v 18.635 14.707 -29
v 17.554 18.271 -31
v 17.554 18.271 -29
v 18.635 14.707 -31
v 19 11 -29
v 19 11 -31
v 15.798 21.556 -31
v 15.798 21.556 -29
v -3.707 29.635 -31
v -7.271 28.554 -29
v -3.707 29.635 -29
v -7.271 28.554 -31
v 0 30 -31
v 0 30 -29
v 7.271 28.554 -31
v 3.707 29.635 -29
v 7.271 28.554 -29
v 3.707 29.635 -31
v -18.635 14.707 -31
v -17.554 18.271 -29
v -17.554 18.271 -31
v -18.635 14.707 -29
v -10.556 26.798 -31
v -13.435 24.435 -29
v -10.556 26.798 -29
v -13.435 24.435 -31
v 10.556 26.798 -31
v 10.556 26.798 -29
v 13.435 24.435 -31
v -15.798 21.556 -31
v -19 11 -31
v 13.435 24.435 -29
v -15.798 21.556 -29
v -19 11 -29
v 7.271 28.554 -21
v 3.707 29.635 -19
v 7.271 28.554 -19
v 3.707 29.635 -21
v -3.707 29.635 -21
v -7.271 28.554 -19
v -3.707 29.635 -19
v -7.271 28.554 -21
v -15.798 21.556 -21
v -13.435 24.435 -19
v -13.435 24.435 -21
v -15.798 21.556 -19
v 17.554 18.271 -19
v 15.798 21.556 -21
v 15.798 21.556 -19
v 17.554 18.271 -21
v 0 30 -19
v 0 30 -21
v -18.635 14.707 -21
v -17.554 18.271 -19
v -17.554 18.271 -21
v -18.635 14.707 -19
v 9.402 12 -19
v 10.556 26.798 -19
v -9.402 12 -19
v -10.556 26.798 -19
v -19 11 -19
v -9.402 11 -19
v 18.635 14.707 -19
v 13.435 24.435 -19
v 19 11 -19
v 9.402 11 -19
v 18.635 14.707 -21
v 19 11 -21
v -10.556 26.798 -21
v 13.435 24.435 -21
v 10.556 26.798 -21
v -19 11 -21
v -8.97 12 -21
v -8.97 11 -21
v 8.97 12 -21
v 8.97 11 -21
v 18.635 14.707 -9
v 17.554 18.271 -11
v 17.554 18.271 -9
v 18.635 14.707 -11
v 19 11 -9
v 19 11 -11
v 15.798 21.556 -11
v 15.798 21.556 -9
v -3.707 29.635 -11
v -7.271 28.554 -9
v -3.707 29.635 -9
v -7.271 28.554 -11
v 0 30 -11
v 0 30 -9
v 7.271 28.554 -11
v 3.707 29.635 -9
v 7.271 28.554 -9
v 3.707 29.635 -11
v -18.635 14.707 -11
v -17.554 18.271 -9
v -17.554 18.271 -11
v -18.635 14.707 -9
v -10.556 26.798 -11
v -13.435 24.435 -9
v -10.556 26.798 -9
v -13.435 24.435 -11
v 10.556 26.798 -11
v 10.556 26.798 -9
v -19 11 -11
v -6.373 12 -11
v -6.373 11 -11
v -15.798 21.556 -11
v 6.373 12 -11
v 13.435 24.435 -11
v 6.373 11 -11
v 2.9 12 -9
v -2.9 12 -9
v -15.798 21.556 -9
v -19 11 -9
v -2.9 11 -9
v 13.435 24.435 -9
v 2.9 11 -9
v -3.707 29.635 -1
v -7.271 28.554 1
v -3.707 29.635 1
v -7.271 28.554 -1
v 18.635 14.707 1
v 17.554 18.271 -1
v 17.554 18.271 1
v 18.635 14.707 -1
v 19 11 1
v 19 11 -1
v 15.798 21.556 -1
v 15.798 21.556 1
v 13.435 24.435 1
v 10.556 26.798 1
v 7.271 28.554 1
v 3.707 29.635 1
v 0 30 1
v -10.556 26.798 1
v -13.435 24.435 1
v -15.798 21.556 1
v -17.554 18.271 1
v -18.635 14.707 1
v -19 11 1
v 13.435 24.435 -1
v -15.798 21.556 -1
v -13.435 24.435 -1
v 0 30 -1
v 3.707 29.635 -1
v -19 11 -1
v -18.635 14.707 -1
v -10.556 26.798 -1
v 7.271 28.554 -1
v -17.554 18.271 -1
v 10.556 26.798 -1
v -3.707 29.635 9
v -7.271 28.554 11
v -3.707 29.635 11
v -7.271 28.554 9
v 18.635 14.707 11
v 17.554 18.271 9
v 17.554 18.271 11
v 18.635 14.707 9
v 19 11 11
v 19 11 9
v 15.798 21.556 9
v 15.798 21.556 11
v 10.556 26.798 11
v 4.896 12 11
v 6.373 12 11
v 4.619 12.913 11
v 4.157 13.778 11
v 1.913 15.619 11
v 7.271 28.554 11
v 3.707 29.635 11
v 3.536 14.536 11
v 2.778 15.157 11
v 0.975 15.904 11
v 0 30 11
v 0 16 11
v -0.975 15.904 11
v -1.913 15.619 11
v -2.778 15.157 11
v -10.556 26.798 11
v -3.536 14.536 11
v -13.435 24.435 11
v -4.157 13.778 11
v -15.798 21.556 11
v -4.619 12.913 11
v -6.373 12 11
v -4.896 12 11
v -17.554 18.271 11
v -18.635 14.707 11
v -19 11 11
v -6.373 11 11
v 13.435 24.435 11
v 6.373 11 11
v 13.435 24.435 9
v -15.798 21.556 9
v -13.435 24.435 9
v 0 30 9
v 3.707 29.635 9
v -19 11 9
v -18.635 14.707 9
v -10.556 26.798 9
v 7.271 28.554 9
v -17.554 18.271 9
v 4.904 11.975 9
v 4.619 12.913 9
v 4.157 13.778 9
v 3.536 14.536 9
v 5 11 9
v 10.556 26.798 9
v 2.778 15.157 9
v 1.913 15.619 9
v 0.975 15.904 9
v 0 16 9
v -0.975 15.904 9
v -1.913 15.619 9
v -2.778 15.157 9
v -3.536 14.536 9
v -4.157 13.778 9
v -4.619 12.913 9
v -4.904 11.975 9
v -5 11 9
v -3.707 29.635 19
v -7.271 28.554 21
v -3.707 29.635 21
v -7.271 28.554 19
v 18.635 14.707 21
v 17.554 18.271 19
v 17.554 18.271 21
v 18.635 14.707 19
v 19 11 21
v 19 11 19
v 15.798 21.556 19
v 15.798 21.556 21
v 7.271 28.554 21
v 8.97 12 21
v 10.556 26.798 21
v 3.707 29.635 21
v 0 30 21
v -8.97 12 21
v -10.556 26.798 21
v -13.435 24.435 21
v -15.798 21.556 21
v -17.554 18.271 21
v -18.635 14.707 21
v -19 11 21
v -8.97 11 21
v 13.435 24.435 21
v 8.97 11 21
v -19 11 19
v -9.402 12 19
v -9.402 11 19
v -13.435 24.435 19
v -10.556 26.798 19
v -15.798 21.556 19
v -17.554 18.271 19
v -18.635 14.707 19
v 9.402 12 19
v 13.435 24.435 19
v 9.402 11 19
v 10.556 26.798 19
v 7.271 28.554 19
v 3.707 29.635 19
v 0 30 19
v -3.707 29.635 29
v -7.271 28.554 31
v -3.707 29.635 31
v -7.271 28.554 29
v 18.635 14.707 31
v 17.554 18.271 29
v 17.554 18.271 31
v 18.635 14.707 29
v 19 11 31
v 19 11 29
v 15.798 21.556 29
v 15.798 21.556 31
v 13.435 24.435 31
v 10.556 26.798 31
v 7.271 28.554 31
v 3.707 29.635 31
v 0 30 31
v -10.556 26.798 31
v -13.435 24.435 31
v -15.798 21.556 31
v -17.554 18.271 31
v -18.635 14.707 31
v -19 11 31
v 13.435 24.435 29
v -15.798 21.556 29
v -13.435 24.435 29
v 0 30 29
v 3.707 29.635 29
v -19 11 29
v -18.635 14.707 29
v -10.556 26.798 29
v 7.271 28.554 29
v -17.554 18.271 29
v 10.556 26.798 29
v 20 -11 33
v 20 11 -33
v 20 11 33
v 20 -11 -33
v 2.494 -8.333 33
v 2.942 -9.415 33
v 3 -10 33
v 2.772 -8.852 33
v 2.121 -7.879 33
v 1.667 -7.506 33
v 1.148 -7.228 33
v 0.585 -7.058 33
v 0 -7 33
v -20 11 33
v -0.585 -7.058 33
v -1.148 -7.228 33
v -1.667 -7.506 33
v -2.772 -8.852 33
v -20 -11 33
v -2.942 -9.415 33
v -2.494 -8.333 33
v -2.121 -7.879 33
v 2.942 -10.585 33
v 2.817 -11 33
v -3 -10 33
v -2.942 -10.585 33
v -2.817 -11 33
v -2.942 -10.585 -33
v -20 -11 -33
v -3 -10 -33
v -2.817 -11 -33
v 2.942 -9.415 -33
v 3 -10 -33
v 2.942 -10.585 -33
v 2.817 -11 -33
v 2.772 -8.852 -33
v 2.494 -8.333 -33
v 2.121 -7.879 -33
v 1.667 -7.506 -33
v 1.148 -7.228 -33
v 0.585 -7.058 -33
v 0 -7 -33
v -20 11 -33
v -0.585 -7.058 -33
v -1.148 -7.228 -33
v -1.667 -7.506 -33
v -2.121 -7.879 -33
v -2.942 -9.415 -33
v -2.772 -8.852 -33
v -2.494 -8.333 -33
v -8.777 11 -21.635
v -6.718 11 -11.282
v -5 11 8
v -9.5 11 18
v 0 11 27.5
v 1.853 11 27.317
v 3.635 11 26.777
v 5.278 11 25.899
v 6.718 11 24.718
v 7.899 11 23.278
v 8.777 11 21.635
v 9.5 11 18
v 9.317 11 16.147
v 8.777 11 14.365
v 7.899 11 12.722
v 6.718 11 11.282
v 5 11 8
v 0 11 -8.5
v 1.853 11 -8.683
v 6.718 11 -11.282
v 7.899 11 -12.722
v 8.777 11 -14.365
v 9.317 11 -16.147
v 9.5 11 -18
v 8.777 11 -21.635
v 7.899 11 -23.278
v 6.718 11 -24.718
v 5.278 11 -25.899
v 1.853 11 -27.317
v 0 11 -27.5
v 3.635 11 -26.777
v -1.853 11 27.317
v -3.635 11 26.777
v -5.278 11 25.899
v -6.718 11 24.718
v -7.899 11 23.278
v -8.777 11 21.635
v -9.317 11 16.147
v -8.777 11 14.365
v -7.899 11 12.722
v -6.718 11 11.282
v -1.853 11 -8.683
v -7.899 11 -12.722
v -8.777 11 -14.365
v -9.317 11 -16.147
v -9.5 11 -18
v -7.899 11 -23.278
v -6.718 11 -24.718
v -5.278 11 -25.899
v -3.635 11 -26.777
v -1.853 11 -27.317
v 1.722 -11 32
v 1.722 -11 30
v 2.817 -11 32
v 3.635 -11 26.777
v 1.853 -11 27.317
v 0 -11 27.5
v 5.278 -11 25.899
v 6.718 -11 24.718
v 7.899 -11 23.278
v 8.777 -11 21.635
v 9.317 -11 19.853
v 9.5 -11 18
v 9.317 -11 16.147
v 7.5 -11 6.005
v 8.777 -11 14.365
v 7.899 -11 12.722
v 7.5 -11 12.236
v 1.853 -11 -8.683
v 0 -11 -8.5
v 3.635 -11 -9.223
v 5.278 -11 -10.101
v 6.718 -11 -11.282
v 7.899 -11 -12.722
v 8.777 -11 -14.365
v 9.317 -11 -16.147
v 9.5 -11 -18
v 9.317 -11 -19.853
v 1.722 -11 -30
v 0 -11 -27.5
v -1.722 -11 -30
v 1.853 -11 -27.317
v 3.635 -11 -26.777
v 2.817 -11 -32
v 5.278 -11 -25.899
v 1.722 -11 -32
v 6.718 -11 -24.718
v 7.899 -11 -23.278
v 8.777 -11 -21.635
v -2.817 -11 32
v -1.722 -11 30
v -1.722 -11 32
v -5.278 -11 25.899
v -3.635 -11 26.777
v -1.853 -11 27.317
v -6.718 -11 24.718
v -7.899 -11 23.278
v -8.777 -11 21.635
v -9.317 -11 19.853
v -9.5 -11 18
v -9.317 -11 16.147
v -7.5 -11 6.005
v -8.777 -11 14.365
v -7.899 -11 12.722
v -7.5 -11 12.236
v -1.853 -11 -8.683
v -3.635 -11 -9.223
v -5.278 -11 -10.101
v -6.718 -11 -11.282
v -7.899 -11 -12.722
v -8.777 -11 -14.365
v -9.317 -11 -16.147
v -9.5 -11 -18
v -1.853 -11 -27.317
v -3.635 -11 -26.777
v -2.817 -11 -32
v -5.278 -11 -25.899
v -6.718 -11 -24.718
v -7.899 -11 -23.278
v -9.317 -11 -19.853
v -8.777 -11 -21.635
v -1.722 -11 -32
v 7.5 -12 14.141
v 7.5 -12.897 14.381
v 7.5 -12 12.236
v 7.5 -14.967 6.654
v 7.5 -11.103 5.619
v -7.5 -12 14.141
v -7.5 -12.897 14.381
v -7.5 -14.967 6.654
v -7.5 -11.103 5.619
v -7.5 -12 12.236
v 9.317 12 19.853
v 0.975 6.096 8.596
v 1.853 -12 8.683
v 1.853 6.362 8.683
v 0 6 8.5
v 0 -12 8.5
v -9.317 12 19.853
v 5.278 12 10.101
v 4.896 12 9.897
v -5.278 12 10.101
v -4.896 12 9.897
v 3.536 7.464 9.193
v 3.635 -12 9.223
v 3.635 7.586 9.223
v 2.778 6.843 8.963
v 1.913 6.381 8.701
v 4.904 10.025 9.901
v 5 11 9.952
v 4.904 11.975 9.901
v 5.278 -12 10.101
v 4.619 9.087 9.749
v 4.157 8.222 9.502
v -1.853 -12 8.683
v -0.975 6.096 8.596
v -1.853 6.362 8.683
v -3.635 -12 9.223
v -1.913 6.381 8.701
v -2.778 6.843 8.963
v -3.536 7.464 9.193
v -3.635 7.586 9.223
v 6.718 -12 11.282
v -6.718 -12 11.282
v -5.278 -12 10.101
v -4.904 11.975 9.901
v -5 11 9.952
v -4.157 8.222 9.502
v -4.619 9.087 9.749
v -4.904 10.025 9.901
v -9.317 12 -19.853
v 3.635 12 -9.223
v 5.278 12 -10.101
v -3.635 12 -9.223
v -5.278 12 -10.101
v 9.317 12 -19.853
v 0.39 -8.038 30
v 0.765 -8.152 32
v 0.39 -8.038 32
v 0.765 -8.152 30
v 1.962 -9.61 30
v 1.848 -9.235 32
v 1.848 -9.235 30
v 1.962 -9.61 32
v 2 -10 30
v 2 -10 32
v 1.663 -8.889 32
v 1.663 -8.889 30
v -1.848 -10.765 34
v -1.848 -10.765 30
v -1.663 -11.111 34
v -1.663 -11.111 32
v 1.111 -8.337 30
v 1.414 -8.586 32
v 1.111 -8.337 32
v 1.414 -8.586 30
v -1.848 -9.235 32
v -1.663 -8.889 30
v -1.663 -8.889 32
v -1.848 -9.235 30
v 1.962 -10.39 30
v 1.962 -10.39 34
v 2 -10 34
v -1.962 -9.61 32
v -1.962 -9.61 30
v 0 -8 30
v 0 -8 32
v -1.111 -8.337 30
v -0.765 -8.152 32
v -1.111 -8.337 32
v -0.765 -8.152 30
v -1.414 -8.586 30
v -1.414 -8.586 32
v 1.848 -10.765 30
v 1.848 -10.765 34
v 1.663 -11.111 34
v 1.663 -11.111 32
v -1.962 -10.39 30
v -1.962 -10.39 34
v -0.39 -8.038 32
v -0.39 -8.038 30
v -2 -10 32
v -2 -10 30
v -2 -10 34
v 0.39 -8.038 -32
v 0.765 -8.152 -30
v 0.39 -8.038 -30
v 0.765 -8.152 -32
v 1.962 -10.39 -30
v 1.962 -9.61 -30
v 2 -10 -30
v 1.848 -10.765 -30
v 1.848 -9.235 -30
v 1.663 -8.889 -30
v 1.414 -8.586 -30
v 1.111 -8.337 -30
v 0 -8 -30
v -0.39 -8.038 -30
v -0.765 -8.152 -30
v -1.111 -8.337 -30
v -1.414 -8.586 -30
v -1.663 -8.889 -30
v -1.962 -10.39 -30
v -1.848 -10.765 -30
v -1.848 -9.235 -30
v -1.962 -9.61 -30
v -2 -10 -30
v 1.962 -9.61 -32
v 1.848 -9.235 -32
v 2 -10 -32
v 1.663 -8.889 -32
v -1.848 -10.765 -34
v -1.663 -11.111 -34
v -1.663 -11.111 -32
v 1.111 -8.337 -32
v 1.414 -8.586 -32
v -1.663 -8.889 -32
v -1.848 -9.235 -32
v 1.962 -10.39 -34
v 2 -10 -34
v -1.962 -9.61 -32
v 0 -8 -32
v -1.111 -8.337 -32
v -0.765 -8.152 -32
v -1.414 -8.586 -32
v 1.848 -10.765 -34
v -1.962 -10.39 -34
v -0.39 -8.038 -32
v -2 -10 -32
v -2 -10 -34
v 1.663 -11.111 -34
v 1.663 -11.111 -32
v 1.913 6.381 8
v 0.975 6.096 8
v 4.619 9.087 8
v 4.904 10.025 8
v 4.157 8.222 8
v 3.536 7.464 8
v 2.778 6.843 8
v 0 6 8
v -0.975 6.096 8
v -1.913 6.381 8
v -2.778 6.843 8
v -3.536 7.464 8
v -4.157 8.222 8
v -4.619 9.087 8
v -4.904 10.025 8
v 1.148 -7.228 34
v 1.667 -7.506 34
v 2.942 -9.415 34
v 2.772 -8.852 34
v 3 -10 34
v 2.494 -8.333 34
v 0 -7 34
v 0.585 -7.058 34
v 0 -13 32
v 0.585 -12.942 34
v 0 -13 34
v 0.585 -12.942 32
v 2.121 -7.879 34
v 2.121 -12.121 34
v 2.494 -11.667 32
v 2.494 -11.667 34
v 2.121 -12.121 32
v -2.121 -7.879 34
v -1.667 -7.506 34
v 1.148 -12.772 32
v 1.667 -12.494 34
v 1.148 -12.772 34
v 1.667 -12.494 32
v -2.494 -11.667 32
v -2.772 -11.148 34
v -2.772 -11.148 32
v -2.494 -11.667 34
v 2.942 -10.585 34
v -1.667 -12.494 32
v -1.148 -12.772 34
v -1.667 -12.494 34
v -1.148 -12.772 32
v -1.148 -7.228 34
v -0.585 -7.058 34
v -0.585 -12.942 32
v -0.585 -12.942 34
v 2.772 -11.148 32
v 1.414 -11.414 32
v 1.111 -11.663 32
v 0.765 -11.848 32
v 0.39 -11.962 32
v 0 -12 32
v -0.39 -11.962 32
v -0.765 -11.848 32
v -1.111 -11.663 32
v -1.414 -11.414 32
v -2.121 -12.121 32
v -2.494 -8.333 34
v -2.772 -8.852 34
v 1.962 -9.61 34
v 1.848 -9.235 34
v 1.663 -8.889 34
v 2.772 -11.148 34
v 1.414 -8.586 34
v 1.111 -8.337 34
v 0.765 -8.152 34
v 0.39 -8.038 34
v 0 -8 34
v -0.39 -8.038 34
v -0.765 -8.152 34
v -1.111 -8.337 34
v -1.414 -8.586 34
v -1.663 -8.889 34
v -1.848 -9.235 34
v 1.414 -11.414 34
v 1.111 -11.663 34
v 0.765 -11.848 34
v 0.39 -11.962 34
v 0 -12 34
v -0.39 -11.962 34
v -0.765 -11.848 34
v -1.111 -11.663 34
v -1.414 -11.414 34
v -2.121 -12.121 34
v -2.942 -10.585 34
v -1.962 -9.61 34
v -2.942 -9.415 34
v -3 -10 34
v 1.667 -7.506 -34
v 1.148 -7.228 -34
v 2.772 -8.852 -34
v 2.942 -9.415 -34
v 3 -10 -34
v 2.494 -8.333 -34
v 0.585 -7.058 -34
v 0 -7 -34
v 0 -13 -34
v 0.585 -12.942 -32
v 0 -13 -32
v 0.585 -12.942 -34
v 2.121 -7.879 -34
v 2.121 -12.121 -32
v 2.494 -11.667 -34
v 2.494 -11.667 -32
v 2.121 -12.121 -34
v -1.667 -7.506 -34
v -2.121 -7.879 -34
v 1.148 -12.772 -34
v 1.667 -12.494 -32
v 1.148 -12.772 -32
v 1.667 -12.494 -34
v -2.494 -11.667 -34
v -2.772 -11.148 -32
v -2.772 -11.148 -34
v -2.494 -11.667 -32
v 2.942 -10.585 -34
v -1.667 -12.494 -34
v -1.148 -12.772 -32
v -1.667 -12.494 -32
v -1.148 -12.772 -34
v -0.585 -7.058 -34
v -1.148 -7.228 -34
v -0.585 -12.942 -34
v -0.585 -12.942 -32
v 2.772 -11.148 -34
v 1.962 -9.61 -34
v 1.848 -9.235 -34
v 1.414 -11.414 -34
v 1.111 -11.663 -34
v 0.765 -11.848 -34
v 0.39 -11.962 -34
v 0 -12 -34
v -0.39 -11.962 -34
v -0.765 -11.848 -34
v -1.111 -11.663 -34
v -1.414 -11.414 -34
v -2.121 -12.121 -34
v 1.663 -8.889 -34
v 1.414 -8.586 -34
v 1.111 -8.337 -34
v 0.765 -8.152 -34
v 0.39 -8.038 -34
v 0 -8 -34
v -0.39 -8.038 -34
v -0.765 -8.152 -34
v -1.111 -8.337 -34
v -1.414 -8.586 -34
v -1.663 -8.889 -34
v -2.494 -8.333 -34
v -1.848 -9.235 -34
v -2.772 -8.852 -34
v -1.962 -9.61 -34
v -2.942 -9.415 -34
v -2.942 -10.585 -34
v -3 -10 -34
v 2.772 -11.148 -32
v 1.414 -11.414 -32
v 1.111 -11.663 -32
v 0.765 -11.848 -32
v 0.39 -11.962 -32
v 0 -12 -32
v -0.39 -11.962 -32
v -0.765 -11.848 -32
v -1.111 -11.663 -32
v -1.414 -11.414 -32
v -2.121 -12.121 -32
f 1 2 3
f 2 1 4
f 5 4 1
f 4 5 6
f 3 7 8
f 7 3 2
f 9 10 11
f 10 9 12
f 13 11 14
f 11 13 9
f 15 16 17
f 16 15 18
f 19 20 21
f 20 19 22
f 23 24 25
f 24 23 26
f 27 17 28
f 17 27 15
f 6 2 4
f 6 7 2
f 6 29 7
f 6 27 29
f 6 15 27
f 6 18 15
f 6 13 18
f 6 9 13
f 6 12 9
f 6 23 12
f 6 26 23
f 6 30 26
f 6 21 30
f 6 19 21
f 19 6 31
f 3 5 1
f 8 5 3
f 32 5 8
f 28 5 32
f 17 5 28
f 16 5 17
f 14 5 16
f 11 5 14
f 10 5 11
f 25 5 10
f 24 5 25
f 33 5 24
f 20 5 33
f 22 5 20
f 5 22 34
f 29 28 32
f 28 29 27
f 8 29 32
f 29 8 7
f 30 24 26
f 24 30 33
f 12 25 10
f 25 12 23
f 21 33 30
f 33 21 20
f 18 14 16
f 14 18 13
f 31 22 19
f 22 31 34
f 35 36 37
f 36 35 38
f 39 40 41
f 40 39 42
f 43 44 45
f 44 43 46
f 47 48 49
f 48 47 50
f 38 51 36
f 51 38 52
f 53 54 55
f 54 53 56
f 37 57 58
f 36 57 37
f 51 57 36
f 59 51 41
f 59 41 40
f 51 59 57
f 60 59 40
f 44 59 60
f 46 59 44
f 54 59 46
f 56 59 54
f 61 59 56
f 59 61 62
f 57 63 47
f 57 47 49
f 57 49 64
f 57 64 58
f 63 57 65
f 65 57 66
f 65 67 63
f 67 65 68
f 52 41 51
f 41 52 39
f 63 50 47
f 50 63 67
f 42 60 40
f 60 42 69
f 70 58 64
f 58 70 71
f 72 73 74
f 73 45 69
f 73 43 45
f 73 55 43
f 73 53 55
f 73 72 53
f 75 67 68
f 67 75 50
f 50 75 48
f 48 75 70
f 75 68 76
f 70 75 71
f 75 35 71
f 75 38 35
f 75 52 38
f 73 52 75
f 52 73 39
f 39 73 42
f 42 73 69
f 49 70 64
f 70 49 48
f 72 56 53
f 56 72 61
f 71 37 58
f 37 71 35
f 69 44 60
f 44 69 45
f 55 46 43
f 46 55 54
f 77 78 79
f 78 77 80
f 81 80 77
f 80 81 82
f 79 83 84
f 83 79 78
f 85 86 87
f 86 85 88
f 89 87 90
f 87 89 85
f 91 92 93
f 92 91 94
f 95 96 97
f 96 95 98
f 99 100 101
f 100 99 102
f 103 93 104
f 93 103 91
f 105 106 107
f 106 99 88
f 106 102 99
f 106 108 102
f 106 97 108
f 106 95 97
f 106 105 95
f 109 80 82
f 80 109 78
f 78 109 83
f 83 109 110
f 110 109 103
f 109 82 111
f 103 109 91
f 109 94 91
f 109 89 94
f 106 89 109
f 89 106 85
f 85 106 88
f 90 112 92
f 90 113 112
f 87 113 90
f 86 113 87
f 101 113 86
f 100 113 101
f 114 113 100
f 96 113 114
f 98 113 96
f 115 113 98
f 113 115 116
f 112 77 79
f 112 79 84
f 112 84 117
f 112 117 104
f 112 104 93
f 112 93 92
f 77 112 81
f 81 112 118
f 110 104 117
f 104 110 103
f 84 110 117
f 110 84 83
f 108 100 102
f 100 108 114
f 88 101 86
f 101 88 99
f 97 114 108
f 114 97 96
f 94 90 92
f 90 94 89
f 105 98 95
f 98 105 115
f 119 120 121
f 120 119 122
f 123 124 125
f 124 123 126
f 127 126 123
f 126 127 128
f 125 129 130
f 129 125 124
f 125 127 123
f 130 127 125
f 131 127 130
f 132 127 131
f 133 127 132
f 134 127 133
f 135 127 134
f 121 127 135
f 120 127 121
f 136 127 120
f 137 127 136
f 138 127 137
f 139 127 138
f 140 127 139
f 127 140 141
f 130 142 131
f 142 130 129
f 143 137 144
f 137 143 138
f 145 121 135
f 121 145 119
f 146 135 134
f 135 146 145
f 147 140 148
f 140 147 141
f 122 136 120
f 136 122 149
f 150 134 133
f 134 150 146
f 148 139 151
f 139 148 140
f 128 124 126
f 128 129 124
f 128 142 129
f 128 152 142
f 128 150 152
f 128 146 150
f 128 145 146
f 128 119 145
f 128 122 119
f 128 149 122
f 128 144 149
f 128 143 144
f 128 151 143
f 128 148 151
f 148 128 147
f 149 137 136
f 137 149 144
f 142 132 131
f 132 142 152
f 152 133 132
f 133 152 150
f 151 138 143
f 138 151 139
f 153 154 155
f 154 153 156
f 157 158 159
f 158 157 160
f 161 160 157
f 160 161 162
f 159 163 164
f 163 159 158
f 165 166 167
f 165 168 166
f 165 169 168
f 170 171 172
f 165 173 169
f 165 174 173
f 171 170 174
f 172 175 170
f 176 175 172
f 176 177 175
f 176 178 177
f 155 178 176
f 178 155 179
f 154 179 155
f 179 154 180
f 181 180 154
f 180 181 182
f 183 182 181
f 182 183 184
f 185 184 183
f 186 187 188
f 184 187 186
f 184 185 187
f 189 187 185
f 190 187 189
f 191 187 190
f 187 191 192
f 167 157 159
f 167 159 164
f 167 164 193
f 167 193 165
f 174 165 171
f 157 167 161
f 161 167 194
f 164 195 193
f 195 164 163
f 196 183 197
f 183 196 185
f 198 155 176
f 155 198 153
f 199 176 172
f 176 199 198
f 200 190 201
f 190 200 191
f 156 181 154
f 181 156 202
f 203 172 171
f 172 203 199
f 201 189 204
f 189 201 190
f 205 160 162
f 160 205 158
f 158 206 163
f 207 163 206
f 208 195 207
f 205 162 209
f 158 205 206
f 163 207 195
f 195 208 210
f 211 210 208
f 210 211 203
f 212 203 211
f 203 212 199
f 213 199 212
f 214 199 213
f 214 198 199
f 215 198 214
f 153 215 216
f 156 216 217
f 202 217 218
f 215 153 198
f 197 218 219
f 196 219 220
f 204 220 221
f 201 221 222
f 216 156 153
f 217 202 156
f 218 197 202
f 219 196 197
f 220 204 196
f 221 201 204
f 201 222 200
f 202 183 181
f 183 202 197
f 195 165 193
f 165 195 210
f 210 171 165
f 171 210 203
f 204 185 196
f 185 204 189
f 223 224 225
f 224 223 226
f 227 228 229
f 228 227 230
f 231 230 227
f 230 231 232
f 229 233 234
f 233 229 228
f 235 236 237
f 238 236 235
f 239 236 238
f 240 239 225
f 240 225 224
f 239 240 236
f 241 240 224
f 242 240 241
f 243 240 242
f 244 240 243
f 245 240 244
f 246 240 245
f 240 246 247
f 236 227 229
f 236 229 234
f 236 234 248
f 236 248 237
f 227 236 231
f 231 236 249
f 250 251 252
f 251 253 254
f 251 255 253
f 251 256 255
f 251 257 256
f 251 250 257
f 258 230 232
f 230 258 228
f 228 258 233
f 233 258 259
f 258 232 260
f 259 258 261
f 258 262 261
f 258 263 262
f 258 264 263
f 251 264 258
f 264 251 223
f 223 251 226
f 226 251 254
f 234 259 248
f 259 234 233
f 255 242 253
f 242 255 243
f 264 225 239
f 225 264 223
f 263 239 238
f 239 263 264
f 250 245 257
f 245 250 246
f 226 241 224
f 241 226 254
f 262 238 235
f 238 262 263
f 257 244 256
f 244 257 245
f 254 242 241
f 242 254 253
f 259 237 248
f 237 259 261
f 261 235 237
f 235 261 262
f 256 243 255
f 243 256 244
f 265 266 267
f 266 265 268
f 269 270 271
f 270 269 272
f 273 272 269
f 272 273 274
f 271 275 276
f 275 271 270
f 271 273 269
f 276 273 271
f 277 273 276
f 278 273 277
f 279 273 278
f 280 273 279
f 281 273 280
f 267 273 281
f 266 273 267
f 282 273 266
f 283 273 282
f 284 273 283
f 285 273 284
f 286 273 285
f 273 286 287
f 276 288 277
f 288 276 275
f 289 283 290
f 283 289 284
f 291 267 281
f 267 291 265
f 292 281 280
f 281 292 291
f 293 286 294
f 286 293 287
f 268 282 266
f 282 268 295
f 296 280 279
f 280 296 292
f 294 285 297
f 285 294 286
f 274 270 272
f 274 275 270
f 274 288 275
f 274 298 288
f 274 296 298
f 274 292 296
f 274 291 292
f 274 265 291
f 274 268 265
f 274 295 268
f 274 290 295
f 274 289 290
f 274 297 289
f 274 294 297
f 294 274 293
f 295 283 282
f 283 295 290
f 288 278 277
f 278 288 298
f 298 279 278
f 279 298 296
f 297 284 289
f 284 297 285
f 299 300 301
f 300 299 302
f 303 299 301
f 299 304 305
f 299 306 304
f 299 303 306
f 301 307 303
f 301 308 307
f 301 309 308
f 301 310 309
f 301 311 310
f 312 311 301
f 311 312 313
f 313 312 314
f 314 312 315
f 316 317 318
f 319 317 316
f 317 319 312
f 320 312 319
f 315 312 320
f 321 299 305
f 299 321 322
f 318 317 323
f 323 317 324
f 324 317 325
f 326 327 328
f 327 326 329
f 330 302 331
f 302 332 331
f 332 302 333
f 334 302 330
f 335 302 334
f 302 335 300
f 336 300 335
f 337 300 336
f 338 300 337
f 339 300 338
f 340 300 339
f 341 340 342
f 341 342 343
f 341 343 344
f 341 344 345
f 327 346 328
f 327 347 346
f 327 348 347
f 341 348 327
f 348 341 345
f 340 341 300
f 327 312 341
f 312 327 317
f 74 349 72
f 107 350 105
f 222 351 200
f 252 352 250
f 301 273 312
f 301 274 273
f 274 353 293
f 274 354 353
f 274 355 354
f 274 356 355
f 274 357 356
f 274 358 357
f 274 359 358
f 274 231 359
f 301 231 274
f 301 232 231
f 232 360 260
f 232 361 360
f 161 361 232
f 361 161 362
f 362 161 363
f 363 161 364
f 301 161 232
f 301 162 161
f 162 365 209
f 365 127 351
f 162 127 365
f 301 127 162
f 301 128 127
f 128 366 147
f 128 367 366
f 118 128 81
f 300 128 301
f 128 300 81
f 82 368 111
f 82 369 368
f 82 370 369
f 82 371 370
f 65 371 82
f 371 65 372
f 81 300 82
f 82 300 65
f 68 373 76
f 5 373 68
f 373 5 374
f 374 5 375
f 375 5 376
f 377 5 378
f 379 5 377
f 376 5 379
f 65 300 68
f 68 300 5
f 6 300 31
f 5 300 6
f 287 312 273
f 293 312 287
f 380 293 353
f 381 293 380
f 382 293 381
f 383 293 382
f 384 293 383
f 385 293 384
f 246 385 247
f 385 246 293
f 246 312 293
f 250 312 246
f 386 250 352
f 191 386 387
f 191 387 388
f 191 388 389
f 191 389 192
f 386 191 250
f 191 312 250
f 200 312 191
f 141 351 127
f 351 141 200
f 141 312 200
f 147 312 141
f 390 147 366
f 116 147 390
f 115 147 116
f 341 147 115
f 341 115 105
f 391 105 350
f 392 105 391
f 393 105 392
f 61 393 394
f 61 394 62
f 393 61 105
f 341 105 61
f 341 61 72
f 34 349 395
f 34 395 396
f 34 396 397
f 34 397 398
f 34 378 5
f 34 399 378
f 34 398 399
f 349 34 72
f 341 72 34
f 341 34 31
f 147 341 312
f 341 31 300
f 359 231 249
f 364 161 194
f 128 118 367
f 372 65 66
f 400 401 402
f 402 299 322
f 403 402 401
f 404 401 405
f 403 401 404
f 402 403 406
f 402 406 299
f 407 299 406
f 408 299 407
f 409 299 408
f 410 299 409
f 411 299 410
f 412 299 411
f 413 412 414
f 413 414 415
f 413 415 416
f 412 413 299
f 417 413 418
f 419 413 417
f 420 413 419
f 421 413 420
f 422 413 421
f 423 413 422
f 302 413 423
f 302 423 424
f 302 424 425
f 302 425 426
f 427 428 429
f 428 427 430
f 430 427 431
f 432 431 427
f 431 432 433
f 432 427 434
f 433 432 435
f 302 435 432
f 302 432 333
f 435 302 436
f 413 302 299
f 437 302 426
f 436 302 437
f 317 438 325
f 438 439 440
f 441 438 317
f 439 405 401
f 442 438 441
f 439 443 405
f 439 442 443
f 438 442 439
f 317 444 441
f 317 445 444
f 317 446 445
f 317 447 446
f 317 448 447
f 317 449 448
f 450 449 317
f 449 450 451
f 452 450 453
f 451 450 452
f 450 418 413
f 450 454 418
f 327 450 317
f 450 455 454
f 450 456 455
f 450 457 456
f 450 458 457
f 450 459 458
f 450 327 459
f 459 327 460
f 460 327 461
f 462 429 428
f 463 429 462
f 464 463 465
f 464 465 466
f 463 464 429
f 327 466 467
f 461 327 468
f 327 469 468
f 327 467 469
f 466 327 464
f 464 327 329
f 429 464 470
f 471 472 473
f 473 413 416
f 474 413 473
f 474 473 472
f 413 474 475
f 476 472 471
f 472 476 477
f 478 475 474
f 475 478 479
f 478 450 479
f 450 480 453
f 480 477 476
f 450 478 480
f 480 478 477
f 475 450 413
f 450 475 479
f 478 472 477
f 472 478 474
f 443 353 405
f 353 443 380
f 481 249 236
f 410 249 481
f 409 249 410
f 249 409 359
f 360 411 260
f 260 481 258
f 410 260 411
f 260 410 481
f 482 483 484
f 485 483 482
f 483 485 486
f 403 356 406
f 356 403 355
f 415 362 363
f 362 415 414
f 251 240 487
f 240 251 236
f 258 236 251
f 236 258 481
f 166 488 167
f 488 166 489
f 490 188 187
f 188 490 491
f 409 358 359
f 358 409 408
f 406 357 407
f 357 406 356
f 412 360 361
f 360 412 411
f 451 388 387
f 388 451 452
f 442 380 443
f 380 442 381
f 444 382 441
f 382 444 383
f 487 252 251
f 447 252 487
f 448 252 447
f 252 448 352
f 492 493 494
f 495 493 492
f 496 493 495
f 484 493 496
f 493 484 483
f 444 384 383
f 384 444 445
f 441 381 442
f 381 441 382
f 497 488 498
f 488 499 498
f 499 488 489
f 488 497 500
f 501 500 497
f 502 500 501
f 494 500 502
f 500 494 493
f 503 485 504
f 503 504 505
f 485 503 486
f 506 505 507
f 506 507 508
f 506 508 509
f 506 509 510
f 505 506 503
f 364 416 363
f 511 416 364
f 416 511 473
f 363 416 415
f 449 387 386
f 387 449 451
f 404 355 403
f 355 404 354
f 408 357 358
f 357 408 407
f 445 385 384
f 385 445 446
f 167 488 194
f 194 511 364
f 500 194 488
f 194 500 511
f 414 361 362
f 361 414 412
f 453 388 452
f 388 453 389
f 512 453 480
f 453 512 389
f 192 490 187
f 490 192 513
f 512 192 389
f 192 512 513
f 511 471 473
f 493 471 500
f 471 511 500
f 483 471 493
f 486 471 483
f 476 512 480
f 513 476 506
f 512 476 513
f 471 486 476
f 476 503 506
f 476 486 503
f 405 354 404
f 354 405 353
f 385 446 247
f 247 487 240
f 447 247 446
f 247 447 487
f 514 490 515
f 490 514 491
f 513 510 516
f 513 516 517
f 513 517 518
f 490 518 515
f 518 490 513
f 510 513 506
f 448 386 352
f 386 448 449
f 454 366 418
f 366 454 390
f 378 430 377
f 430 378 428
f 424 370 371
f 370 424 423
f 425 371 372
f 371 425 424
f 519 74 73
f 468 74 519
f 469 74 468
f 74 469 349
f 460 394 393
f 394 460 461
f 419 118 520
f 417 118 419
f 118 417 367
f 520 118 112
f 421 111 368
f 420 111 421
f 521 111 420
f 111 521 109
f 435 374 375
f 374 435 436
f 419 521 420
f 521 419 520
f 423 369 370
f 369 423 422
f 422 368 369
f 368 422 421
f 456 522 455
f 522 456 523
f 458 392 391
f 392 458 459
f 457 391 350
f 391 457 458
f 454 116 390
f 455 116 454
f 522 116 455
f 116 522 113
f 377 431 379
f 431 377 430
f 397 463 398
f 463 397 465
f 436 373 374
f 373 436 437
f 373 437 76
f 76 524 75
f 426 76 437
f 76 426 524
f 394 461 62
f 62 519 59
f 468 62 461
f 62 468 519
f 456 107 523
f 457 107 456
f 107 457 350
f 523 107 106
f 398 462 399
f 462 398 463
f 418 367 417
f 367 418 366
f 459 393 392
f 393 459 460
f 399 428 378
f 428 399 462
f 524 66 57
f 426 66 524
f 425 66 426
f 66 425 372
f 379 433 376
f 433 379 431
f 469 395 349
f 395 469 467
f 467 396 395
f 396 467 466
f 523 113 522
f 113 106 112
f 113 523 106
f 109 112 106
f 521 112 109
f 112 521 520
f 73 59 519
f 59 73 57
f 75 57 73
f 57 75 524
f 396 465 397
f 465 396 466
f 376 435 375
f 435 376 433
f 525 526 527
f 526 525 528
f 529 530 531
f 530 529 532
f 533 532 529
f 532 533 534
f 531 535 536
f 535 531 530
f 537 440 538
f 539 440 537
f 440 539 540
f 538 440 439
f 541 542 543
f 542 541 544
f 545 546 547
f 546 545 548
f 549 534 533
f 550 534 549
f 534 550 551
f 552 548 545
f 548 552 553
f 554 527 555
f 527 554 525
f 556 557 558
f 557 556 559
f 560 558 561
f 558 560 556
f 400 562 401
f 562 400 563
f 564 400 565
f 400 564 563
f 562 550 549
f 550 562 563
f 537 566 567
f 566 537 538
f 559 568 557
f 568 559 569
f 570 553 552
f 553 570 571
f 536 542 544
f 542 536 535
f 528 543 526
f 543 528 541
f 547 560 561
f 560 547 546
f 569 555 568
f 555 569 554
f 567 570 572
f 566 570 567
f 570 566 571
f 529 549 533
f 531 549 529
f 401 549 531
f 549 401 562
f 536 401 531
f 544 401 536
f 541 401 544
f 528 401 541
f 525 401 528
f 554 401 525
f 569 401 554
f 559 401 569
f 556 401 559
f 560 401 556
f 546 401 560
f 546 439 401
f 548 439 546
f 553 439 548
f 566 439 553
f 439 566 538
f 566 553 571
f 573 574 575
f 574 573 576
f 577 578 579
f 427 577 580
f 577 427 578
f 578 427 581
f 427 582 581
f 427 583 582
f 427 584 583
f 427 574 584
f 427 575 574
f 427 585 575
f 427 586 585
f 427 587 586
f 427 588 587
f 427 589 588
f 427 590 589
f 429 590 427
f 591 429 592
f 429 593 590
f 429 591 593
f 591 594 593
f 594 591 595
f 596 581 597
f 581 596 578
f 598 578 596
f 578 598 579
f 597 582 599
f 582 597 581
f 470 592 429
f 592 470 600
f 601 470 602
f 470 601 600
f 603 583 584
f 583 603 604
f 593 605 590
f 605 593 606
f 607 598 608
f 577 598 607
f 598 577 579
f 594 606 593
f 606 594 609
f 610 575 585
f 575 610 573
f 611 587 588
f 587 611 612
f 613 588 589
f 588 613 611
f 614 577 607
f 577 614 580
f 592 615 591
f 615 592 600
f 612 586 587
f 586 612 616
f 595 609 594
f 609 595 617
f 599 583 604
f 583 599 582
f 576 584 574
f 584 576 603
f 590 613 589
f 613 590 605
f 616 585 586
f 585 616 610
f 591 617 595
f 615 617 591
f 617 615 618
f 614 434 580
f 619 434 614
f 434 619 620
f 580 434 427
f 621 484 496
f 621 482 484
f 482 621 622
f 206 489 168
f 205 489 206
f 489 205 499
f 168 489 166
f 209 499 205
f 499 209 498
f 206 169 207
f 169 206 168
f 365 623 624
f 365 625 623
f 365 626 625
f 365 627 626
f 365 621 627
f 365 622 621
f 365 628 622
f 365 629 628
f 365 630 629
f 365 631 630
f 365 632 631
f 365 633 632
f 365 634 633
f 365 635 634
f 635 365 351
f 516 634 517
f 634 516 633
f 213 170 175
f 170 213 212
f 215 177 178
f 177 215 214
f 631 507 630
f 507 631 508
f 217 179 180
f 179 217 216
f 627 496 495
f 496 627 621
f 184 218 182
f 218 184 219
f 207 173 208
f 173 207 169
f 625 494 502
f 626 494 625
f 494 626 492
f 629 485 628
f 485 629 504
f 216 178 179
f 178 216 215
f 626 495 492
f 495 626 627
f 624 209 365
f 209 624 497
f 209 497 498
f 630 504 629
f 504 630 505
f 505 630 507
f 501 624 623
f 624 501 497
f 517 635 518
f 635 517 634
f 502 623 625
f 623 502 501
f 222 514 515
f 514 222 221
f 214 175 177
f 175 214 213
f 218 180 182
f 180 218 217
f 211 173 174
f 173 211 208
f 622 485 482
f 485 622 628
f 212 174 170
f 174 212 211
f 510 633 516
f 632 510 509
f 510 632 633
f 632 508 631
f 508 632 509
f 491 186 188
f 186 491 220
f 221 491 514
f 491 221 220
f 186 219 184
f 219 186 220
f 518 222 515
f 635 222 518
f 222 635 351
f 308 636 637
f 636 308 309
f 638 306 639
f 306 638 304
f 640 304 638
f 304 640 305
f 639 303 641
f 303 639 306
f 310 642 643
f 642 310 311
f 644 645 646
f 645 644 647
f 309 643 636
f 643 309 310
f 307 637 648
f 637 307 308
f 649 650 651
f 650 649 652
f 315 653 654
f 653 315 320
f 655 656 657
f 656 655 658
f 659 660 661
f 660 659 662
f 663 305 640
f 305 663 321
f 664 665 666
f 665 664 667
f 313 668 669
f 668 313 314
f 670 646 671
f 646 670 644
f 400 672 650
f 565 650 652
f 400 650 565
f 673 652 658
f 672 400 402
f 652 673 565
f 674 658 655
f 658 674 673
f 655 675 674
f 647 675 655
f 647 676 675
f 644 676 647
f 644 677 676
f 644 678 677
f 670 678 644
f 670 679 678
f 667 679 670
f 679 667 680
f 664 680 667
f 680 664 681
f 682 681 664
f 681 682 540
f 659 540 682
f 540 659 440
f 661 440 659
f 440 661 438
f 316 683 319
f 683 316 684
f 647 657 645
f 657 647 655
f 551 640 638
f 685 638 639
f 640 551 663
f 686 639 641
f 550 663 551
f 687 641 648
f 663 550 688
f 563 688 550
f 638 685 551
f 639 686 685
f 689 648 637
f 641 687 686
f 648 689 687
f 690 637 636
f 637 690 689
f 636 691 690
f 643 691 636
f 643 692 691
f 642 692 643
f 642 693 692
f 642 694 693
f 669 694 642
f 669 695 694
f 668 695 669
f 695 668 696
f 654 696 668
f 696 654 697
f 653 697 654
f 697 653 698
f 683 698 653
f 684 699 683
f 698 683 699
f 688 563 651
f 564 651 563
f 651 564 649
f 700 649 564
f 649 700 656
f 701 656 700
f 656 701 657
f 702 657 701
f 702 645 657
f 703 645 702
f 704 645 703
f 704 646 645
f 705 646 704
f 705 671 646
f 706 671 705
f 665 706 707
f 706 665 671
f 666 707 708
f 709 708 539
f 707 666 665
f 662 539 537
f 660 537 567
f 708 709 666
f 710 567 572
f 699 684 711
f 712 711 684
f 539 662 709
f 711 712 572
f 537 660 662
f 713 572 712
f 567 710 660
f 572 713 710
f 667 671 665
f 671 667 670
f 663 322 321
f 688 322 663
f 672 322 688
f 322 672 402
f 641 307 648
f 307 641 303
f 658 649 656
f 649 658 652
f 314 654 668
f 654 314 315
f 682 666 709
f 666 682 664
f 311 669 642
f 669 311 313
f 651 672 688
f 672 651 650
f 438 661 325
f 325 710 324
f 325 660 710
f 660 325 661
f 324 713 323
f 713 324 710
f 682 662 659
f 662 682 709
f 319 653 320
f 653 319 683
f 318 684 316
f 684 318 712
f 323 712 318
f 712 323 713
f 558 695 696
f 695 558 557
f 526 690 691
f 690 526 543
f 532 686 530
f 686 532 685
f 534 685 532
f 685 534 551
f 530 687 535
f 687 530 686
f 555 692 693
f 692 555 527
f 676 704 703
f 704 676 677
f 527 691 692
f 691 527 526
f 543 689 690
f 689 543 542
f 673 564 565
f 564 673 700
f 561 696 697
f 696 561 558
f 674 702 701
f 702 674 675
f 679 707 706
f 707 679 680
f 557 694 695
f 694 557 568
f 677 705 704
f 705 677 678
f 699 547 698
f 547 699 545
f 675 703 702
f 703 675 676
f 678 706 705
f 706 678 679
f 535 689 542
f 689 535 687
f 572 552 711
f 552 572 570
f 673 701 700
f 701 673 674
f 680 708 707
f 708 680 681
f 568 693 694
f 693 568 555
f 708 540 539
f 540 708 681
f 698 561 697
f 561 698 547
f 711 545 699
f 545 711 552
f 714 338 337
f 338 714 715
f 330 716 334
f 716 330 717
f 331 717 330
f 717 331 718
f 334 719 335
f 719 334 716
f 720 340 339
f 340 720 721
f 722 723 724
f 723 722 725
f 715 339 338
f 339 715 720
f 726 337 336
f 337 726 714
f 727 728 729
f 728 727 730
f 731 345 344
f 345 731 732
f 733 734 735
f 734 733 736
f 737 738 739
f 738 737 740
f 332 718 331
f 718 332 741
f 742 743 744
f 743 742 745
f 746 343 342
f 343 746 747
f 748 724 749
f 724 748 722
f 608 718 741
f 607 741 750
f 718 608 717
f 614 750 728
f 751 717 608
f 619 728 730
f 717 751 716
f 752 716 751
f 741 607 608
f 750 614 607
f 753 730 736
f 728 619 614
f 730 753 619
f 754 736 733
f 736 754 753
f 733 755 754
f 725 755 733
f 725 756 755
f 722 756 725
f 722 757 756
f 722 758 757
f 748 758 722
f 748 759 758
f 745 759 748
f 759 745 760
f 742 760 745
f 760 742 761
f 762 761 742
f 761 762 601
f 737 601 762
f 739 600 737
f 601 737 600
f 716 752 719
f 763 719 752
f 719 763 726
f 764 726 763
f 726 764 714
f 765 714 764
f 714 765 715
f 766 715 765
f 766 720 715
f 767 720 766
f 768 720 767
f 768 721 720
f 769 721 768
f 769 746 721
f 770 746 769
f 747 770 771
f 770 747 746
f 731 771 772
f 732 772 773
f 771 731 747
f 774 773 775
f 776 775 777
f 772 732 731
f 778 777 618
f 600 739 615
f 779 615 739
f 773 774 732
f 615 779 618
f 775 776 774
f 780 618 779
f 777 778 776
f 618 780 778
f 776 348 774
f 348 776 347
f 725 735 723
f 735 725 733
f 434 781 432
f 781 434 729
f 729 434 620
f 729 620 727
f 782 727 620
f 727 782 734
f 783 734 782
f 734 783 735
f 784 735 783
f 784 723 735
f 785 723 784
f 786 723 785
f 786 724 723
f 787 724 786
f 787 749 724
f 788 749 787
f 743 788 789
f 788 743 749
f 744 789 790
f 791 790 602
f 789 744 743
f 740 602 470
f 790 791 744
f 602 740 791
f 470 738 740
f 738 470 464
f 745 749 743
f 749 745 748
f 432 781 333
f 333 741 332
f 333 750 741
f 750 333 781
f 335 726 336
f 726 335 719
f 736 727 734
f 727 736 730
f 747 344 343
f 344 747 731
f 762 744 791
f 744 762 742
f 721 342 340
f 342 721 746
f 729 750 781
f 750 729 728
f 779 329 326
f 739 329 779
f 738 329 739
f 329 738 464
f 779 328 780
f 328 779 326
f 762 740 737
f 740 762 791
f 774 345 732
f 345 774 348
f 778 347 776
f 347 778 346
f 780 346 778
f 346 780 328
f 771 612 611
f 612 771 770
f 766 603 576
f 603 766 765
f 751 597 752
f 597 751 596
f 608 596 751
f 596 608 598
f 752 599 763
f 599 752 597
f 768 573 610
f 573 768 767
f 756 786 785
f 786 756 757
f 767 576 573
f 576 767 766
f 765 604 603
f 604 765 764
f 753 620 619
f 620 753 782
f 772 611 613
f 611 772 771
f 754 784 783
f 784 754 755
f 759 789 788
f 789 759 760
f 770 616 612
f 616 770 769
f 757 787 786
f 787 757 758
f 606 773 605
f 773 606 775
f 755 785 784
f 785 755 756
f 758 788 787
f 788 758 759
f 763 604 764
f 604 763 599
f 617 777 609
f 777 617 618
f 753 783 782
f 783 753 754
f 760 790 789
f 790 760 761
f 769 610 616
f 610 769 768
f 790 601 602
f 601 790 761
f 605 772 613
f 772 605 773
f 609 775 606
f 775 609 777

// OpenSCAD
// COBRA-Snap Battery Cartridge
// Holds 2x 18650 cells, slides into vertebra

$fn = 32;

module battery_cartridge() {
    difference() {
        union() {
            // Main housing
            cube([40, 22, 66], center=true);
            
            // Locking tab (flexible)
            translate([0, -12, 10])
            rotate([-15, 0, 0])
            cube([15, 4, 8], center=true);
            
            // Grip texture
            for(i = [-30:10:30]) {
                translate([0, 11, i])
                cylinder(h=2, d=38, center=true);
            }
        }
        
        // Cell cavities (2x)
        translate([0, 0, 18])
        rotate([90, 0, 0])
        cylinder(h=24, d=19, center=true);
        
        translate([0, 0, -18])
        rotate([90, 0, 0])
        cylinder(h=24, d=19, center=true);
        
        // Contact pin holes
        translate([0, -10, 33])
        cylinder(h=6, d=4, center=true);
        
        translate([0, -10, -33])
        cylinder(h=6, d=4, center=true);
        
        // Ejector button access
        translate([0, 11, 10])
        cylinder(h=4, d=10, center=true);
    }
    
    // Spring contacts (simplified)
    for(z = [33, -33]) {
        translate([0, -10, z])
        difference() {
            cylinder(h=2, d=6, center=true);
            cylinder(h=3, d=4, center=true);
        }
    }
}

battery_cartridge();
